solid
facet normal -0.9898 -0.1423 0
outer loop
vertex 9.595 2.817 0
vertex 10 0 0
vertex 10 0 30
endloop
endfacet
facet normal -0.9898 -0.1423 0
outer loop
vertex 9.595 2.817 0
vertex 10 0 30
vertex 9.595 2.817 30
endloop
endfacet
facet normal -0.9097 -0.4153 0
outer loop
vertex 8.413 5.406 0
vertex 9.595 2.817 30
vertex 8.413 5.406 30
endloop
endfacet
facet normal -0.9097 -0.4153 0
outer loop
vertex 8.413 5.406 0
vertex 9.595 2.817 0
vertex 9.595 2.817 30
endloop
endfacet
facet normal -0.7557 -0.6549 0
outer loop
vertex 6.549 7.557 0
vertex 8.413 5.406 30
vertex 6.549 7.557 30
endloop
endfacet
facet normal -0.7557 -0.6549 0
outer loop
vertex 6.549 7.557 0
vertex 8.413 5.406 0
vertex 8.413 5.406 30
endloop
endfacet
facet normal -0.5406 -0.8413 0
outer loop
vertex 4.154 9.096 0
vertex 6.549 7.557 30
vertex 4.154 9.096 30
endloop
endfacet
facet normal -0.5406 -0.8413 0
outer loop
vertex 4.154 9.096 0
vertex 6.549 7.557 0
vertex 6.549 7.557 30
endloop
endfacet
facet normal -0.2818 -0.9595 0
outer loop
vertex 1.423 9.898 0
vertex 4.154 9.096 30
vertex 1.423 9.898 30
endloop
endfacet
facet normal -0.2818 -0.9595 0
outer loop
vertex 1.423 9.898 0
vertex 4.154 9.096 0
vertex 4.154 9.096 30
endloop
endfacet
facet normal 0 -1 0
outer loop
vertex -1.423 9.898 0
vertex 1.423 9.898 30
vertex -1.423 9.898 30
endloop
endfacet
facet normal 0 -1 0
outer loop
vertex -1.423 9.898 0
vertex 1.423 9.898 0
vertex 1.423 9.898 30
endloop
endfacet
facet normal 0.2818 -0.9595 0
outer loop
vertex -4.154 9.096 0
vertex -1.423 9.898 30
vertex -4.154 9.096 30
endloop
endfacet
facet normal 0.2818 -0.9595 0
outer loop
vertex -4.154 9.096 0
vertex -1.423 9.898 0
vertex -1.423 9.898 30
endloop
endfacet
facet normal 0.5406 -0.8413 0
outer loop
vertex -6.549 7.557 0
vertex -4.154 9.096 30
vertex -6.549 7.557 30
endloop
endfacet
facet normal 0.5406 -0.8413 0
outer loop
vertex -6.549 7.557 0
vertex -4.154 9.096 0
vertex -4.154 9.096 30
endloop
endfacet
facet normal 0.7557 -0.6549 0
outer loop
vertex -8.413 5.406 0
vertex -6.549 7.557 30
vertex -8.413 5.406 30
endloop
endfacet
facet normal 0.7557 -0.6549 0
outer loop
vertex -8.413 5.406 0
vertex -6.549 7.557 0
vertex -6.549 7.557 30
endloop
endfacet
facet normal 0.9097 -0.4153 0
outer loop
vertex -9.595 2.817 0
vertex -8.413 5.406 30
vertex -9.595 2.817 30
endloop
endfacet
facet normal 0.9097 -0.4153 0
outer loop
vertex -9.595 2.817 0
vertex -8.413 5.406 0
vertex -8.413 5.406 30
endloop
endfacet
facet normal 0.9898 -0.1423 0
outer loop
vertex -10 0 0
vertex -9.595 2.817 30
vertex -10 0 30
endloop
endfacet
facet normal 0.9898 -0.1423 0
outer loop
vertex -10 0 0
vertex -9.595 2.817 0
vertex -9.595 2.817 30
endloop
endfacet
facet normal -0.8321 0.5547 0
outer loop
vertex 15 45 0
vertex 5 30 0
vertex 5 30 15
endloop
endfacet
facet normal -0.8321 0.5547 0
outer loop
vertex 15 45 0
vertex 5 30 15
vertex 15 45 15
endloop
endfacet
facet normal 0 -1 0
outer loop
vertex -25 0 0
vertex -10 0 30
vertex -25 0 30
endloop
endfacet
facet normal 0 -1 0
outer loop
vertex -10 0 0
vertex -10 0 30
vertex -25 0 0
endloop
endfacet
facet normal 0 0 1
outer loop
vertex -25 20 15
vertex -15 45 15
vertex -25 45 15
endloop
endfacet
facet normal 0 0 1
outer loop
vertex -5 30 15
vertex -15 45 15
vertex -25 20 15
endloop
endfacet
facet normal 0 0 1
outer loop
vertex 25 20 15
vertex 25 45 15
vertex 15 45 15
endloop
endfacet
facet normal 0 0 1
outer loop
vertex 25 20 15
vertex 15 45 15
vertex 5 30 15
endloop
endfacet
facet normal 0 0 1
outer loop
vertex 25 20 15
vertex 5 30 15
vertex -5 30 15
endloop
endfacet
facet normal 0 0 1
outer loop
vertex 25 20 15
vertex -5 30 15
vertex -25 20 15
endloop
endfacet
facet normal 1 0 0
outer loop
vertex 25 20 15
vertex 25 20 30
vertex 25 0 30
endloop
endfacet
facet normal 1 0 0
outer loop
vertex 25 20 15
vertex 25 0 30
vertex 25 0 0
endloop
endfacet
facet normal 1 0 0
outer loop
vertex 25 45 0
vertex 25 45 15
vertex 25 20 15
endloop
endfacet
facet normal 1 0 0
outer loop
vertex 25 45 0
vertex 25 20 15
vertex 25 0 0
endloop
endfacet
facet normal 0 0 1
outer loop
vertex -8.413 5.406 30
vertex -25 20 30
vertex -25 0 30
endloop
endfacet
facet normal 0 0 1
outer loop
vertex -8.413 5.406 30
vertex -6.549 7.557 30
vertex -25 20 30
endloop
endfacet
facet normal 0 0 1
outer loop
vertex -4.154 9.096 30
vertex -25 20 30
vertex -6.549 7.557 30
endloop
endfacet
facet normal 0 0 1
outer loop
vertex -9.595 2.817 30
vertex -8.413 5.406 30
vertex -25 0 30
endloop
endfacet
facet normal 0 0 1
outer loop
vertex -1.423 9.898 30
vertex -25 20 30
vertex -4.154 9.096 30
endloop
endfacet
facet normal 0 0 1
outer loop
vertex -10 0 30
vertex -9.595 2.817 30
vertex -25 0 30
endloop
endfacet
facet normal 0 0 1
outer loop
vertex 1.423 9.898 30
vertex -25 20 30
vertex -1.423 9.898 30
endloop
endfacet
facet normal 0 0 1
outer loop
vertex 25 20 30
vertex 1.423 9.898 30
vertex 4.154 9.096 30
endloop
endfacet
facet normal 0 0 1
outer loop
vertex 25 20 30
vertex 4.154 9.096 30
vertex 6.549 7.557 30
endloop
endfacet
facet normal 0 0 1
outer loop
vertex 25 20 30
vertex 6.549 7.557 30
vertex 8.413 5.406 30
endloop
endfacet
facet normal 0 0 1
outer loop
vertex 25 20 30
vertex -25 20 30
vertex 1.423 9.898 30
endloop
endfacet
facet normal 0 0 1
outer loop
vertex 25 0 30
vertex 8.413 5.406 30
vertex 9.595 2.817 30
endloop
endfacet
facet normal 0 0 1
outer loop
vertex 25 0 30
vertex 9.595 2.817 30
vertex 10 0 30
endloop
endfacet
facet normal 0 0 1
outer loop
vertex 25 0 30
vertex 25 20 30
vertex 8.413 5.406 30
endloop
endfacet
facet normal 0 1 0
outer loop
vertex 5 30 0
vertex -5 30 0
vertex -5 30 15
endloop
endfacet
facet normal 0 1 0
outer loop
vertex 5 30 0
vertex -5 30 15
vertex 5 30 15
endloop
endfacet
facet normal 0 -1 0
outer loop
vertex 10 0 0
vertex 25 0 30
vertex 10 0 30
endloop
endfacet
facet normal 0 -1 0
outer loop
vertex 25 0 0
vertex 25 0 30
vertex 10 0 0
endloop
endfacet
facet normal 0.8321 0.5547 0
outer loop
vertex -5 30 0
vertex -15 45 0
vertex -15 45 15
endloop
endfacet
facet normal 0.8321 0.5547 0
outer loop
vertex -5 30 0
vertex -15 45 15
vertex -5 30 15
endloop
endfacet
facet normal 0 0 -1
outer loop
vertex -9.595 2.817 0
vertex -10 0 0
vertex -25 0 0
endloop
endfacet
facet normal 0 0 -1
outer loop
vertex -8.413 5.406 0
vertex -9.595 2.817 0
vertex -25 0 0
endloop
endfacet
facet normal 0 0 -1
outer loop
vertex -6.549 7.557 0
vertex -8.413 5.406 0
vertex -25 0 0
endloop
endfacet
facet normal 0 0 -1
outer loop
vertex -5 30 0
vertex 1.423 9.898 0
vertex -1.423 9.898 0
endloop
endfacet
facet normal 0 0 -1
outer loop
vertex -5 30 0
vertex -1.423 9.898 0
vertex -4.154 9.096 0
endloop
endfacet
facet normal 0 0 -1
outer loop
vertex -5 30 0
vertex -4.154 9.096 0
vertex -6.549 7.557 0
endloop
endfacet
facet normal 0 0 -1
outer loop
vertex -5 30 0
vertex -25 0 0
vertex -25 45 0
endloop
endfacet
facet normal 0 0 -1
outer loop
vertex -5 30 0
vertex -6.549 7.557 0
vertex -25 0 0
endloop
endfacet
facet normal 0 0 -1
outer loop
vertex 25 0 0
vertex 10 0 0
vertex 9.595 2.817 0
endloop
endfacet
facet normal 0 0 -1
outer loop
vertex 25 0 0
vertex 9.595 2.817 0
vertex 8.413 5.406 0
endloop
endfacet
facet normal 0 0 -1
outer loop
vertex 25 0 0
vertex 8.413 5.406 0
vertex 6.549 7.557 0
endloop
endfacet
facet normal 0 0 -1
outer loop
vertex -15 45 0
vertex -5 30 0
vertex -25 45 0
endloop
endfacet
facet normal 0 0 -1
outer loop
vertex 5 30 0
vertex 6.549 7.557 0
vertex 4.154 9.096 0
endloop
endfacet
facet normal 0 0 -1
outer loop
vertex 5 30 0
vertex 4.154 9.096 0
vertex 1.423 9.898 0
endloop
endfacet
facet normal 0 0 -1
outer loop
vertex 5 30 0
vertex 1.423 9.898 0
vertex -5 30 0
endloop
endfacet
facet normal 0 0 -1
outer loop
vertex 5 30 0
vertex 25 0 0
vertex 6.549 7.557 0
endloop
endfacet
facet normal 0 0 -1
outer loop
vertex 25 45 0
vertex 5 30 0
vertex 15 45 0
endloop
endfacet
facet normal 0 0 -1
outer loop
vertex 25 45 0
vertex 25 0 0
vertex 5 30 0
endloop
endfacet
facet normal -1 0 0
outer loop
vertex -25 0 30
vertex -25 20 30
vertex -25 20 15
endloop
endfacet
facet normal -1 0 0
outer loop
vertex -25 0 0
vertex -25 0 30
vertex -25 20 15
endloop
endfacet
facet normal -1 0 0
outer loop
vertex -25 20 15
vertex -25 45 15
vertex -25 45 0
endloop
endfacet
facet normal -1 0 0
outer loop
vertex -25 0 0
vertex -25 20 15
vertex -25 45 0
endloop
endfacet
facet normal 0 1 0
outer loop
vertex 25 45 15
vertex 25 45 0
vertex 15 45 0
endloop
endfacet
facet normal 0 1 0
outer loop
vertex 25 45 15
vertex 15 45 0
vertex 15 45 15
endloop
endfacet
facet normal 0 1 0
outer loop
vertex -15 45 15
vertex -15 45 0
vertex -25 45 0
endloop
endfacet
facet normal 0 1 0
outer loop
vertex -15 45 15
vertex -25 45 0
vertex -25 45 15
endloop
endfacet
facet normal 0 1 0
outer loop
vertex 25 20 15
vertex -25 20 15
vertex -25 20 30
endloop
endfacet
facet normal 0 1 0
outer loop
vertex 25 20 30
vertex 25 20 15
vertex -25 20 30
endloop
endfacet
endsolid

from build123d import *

# Parameters (mm, degrees)
SALIENTE_EXTRUIR1_DEPTH = 25
CORTAR_EXTRUIR2_REACH   = 61.582


with BuildPart() as part:
    # Croquis2 → Saliente-Extruir1 (new, symmetric)
    with BuildSketch(Plane(origin=(0, 0, 0), x_dir=(0, 0, -1), z_dir=(1, 0, 0))):
        Polygon((0, 0), (0, 45), (-15, 45), (-15, 20), (-30, 20), (-30, 0), align=None)
    extrude(amount=SALIENTE_EXTRUIR1_DEPTH, both=True)

    # Croquis4 → Cortar-Extruir2 (cut, up to next)
    with BuildSketch(Plane.XY, mode=Mode.PRIVATE) as cortar_extruir2_sk1:
        with BuildLine():
            Line((-10, 0), (10, 0))
            ThreePointArc((10, 0), (0, 10), (-10, 0))
        make_face()
    cortar_extruir2_tool1 = extrude(cortar_extruir2_sk1.sketch, amount=CORTAR_EXTRUIR2_REACH, mode=Mode.PRIVATE) & part.part
    # Croquis4 → Cortar-Extruir2 (cut, up to next)
    with BuildSketch(Plane.XY, mode=Mode.PRIVATE) as cortar_extruir2_sk2:
        Polygon((-15, 45), (-5, 30), (5, 30), (15, 45), align=None)
    cortar_extruir2_tool2 = extrude(cortar_extruir2_sk2.sketch, amount=CORTAR_EXTRUIR2_REACH, mode=Mode.PRIVATE) & part.part
    add(cortar_extruir2_tool1.solids().sort_by_distance((0, 4.244132, 0))[0], mode=Mode.SUBTRACT)
    add(cortar_extruir2_tool2.solids().sort_by_distance((0, 38.75, 0))[0], mode=Mode.SUBTRACT)


solid = part.part
